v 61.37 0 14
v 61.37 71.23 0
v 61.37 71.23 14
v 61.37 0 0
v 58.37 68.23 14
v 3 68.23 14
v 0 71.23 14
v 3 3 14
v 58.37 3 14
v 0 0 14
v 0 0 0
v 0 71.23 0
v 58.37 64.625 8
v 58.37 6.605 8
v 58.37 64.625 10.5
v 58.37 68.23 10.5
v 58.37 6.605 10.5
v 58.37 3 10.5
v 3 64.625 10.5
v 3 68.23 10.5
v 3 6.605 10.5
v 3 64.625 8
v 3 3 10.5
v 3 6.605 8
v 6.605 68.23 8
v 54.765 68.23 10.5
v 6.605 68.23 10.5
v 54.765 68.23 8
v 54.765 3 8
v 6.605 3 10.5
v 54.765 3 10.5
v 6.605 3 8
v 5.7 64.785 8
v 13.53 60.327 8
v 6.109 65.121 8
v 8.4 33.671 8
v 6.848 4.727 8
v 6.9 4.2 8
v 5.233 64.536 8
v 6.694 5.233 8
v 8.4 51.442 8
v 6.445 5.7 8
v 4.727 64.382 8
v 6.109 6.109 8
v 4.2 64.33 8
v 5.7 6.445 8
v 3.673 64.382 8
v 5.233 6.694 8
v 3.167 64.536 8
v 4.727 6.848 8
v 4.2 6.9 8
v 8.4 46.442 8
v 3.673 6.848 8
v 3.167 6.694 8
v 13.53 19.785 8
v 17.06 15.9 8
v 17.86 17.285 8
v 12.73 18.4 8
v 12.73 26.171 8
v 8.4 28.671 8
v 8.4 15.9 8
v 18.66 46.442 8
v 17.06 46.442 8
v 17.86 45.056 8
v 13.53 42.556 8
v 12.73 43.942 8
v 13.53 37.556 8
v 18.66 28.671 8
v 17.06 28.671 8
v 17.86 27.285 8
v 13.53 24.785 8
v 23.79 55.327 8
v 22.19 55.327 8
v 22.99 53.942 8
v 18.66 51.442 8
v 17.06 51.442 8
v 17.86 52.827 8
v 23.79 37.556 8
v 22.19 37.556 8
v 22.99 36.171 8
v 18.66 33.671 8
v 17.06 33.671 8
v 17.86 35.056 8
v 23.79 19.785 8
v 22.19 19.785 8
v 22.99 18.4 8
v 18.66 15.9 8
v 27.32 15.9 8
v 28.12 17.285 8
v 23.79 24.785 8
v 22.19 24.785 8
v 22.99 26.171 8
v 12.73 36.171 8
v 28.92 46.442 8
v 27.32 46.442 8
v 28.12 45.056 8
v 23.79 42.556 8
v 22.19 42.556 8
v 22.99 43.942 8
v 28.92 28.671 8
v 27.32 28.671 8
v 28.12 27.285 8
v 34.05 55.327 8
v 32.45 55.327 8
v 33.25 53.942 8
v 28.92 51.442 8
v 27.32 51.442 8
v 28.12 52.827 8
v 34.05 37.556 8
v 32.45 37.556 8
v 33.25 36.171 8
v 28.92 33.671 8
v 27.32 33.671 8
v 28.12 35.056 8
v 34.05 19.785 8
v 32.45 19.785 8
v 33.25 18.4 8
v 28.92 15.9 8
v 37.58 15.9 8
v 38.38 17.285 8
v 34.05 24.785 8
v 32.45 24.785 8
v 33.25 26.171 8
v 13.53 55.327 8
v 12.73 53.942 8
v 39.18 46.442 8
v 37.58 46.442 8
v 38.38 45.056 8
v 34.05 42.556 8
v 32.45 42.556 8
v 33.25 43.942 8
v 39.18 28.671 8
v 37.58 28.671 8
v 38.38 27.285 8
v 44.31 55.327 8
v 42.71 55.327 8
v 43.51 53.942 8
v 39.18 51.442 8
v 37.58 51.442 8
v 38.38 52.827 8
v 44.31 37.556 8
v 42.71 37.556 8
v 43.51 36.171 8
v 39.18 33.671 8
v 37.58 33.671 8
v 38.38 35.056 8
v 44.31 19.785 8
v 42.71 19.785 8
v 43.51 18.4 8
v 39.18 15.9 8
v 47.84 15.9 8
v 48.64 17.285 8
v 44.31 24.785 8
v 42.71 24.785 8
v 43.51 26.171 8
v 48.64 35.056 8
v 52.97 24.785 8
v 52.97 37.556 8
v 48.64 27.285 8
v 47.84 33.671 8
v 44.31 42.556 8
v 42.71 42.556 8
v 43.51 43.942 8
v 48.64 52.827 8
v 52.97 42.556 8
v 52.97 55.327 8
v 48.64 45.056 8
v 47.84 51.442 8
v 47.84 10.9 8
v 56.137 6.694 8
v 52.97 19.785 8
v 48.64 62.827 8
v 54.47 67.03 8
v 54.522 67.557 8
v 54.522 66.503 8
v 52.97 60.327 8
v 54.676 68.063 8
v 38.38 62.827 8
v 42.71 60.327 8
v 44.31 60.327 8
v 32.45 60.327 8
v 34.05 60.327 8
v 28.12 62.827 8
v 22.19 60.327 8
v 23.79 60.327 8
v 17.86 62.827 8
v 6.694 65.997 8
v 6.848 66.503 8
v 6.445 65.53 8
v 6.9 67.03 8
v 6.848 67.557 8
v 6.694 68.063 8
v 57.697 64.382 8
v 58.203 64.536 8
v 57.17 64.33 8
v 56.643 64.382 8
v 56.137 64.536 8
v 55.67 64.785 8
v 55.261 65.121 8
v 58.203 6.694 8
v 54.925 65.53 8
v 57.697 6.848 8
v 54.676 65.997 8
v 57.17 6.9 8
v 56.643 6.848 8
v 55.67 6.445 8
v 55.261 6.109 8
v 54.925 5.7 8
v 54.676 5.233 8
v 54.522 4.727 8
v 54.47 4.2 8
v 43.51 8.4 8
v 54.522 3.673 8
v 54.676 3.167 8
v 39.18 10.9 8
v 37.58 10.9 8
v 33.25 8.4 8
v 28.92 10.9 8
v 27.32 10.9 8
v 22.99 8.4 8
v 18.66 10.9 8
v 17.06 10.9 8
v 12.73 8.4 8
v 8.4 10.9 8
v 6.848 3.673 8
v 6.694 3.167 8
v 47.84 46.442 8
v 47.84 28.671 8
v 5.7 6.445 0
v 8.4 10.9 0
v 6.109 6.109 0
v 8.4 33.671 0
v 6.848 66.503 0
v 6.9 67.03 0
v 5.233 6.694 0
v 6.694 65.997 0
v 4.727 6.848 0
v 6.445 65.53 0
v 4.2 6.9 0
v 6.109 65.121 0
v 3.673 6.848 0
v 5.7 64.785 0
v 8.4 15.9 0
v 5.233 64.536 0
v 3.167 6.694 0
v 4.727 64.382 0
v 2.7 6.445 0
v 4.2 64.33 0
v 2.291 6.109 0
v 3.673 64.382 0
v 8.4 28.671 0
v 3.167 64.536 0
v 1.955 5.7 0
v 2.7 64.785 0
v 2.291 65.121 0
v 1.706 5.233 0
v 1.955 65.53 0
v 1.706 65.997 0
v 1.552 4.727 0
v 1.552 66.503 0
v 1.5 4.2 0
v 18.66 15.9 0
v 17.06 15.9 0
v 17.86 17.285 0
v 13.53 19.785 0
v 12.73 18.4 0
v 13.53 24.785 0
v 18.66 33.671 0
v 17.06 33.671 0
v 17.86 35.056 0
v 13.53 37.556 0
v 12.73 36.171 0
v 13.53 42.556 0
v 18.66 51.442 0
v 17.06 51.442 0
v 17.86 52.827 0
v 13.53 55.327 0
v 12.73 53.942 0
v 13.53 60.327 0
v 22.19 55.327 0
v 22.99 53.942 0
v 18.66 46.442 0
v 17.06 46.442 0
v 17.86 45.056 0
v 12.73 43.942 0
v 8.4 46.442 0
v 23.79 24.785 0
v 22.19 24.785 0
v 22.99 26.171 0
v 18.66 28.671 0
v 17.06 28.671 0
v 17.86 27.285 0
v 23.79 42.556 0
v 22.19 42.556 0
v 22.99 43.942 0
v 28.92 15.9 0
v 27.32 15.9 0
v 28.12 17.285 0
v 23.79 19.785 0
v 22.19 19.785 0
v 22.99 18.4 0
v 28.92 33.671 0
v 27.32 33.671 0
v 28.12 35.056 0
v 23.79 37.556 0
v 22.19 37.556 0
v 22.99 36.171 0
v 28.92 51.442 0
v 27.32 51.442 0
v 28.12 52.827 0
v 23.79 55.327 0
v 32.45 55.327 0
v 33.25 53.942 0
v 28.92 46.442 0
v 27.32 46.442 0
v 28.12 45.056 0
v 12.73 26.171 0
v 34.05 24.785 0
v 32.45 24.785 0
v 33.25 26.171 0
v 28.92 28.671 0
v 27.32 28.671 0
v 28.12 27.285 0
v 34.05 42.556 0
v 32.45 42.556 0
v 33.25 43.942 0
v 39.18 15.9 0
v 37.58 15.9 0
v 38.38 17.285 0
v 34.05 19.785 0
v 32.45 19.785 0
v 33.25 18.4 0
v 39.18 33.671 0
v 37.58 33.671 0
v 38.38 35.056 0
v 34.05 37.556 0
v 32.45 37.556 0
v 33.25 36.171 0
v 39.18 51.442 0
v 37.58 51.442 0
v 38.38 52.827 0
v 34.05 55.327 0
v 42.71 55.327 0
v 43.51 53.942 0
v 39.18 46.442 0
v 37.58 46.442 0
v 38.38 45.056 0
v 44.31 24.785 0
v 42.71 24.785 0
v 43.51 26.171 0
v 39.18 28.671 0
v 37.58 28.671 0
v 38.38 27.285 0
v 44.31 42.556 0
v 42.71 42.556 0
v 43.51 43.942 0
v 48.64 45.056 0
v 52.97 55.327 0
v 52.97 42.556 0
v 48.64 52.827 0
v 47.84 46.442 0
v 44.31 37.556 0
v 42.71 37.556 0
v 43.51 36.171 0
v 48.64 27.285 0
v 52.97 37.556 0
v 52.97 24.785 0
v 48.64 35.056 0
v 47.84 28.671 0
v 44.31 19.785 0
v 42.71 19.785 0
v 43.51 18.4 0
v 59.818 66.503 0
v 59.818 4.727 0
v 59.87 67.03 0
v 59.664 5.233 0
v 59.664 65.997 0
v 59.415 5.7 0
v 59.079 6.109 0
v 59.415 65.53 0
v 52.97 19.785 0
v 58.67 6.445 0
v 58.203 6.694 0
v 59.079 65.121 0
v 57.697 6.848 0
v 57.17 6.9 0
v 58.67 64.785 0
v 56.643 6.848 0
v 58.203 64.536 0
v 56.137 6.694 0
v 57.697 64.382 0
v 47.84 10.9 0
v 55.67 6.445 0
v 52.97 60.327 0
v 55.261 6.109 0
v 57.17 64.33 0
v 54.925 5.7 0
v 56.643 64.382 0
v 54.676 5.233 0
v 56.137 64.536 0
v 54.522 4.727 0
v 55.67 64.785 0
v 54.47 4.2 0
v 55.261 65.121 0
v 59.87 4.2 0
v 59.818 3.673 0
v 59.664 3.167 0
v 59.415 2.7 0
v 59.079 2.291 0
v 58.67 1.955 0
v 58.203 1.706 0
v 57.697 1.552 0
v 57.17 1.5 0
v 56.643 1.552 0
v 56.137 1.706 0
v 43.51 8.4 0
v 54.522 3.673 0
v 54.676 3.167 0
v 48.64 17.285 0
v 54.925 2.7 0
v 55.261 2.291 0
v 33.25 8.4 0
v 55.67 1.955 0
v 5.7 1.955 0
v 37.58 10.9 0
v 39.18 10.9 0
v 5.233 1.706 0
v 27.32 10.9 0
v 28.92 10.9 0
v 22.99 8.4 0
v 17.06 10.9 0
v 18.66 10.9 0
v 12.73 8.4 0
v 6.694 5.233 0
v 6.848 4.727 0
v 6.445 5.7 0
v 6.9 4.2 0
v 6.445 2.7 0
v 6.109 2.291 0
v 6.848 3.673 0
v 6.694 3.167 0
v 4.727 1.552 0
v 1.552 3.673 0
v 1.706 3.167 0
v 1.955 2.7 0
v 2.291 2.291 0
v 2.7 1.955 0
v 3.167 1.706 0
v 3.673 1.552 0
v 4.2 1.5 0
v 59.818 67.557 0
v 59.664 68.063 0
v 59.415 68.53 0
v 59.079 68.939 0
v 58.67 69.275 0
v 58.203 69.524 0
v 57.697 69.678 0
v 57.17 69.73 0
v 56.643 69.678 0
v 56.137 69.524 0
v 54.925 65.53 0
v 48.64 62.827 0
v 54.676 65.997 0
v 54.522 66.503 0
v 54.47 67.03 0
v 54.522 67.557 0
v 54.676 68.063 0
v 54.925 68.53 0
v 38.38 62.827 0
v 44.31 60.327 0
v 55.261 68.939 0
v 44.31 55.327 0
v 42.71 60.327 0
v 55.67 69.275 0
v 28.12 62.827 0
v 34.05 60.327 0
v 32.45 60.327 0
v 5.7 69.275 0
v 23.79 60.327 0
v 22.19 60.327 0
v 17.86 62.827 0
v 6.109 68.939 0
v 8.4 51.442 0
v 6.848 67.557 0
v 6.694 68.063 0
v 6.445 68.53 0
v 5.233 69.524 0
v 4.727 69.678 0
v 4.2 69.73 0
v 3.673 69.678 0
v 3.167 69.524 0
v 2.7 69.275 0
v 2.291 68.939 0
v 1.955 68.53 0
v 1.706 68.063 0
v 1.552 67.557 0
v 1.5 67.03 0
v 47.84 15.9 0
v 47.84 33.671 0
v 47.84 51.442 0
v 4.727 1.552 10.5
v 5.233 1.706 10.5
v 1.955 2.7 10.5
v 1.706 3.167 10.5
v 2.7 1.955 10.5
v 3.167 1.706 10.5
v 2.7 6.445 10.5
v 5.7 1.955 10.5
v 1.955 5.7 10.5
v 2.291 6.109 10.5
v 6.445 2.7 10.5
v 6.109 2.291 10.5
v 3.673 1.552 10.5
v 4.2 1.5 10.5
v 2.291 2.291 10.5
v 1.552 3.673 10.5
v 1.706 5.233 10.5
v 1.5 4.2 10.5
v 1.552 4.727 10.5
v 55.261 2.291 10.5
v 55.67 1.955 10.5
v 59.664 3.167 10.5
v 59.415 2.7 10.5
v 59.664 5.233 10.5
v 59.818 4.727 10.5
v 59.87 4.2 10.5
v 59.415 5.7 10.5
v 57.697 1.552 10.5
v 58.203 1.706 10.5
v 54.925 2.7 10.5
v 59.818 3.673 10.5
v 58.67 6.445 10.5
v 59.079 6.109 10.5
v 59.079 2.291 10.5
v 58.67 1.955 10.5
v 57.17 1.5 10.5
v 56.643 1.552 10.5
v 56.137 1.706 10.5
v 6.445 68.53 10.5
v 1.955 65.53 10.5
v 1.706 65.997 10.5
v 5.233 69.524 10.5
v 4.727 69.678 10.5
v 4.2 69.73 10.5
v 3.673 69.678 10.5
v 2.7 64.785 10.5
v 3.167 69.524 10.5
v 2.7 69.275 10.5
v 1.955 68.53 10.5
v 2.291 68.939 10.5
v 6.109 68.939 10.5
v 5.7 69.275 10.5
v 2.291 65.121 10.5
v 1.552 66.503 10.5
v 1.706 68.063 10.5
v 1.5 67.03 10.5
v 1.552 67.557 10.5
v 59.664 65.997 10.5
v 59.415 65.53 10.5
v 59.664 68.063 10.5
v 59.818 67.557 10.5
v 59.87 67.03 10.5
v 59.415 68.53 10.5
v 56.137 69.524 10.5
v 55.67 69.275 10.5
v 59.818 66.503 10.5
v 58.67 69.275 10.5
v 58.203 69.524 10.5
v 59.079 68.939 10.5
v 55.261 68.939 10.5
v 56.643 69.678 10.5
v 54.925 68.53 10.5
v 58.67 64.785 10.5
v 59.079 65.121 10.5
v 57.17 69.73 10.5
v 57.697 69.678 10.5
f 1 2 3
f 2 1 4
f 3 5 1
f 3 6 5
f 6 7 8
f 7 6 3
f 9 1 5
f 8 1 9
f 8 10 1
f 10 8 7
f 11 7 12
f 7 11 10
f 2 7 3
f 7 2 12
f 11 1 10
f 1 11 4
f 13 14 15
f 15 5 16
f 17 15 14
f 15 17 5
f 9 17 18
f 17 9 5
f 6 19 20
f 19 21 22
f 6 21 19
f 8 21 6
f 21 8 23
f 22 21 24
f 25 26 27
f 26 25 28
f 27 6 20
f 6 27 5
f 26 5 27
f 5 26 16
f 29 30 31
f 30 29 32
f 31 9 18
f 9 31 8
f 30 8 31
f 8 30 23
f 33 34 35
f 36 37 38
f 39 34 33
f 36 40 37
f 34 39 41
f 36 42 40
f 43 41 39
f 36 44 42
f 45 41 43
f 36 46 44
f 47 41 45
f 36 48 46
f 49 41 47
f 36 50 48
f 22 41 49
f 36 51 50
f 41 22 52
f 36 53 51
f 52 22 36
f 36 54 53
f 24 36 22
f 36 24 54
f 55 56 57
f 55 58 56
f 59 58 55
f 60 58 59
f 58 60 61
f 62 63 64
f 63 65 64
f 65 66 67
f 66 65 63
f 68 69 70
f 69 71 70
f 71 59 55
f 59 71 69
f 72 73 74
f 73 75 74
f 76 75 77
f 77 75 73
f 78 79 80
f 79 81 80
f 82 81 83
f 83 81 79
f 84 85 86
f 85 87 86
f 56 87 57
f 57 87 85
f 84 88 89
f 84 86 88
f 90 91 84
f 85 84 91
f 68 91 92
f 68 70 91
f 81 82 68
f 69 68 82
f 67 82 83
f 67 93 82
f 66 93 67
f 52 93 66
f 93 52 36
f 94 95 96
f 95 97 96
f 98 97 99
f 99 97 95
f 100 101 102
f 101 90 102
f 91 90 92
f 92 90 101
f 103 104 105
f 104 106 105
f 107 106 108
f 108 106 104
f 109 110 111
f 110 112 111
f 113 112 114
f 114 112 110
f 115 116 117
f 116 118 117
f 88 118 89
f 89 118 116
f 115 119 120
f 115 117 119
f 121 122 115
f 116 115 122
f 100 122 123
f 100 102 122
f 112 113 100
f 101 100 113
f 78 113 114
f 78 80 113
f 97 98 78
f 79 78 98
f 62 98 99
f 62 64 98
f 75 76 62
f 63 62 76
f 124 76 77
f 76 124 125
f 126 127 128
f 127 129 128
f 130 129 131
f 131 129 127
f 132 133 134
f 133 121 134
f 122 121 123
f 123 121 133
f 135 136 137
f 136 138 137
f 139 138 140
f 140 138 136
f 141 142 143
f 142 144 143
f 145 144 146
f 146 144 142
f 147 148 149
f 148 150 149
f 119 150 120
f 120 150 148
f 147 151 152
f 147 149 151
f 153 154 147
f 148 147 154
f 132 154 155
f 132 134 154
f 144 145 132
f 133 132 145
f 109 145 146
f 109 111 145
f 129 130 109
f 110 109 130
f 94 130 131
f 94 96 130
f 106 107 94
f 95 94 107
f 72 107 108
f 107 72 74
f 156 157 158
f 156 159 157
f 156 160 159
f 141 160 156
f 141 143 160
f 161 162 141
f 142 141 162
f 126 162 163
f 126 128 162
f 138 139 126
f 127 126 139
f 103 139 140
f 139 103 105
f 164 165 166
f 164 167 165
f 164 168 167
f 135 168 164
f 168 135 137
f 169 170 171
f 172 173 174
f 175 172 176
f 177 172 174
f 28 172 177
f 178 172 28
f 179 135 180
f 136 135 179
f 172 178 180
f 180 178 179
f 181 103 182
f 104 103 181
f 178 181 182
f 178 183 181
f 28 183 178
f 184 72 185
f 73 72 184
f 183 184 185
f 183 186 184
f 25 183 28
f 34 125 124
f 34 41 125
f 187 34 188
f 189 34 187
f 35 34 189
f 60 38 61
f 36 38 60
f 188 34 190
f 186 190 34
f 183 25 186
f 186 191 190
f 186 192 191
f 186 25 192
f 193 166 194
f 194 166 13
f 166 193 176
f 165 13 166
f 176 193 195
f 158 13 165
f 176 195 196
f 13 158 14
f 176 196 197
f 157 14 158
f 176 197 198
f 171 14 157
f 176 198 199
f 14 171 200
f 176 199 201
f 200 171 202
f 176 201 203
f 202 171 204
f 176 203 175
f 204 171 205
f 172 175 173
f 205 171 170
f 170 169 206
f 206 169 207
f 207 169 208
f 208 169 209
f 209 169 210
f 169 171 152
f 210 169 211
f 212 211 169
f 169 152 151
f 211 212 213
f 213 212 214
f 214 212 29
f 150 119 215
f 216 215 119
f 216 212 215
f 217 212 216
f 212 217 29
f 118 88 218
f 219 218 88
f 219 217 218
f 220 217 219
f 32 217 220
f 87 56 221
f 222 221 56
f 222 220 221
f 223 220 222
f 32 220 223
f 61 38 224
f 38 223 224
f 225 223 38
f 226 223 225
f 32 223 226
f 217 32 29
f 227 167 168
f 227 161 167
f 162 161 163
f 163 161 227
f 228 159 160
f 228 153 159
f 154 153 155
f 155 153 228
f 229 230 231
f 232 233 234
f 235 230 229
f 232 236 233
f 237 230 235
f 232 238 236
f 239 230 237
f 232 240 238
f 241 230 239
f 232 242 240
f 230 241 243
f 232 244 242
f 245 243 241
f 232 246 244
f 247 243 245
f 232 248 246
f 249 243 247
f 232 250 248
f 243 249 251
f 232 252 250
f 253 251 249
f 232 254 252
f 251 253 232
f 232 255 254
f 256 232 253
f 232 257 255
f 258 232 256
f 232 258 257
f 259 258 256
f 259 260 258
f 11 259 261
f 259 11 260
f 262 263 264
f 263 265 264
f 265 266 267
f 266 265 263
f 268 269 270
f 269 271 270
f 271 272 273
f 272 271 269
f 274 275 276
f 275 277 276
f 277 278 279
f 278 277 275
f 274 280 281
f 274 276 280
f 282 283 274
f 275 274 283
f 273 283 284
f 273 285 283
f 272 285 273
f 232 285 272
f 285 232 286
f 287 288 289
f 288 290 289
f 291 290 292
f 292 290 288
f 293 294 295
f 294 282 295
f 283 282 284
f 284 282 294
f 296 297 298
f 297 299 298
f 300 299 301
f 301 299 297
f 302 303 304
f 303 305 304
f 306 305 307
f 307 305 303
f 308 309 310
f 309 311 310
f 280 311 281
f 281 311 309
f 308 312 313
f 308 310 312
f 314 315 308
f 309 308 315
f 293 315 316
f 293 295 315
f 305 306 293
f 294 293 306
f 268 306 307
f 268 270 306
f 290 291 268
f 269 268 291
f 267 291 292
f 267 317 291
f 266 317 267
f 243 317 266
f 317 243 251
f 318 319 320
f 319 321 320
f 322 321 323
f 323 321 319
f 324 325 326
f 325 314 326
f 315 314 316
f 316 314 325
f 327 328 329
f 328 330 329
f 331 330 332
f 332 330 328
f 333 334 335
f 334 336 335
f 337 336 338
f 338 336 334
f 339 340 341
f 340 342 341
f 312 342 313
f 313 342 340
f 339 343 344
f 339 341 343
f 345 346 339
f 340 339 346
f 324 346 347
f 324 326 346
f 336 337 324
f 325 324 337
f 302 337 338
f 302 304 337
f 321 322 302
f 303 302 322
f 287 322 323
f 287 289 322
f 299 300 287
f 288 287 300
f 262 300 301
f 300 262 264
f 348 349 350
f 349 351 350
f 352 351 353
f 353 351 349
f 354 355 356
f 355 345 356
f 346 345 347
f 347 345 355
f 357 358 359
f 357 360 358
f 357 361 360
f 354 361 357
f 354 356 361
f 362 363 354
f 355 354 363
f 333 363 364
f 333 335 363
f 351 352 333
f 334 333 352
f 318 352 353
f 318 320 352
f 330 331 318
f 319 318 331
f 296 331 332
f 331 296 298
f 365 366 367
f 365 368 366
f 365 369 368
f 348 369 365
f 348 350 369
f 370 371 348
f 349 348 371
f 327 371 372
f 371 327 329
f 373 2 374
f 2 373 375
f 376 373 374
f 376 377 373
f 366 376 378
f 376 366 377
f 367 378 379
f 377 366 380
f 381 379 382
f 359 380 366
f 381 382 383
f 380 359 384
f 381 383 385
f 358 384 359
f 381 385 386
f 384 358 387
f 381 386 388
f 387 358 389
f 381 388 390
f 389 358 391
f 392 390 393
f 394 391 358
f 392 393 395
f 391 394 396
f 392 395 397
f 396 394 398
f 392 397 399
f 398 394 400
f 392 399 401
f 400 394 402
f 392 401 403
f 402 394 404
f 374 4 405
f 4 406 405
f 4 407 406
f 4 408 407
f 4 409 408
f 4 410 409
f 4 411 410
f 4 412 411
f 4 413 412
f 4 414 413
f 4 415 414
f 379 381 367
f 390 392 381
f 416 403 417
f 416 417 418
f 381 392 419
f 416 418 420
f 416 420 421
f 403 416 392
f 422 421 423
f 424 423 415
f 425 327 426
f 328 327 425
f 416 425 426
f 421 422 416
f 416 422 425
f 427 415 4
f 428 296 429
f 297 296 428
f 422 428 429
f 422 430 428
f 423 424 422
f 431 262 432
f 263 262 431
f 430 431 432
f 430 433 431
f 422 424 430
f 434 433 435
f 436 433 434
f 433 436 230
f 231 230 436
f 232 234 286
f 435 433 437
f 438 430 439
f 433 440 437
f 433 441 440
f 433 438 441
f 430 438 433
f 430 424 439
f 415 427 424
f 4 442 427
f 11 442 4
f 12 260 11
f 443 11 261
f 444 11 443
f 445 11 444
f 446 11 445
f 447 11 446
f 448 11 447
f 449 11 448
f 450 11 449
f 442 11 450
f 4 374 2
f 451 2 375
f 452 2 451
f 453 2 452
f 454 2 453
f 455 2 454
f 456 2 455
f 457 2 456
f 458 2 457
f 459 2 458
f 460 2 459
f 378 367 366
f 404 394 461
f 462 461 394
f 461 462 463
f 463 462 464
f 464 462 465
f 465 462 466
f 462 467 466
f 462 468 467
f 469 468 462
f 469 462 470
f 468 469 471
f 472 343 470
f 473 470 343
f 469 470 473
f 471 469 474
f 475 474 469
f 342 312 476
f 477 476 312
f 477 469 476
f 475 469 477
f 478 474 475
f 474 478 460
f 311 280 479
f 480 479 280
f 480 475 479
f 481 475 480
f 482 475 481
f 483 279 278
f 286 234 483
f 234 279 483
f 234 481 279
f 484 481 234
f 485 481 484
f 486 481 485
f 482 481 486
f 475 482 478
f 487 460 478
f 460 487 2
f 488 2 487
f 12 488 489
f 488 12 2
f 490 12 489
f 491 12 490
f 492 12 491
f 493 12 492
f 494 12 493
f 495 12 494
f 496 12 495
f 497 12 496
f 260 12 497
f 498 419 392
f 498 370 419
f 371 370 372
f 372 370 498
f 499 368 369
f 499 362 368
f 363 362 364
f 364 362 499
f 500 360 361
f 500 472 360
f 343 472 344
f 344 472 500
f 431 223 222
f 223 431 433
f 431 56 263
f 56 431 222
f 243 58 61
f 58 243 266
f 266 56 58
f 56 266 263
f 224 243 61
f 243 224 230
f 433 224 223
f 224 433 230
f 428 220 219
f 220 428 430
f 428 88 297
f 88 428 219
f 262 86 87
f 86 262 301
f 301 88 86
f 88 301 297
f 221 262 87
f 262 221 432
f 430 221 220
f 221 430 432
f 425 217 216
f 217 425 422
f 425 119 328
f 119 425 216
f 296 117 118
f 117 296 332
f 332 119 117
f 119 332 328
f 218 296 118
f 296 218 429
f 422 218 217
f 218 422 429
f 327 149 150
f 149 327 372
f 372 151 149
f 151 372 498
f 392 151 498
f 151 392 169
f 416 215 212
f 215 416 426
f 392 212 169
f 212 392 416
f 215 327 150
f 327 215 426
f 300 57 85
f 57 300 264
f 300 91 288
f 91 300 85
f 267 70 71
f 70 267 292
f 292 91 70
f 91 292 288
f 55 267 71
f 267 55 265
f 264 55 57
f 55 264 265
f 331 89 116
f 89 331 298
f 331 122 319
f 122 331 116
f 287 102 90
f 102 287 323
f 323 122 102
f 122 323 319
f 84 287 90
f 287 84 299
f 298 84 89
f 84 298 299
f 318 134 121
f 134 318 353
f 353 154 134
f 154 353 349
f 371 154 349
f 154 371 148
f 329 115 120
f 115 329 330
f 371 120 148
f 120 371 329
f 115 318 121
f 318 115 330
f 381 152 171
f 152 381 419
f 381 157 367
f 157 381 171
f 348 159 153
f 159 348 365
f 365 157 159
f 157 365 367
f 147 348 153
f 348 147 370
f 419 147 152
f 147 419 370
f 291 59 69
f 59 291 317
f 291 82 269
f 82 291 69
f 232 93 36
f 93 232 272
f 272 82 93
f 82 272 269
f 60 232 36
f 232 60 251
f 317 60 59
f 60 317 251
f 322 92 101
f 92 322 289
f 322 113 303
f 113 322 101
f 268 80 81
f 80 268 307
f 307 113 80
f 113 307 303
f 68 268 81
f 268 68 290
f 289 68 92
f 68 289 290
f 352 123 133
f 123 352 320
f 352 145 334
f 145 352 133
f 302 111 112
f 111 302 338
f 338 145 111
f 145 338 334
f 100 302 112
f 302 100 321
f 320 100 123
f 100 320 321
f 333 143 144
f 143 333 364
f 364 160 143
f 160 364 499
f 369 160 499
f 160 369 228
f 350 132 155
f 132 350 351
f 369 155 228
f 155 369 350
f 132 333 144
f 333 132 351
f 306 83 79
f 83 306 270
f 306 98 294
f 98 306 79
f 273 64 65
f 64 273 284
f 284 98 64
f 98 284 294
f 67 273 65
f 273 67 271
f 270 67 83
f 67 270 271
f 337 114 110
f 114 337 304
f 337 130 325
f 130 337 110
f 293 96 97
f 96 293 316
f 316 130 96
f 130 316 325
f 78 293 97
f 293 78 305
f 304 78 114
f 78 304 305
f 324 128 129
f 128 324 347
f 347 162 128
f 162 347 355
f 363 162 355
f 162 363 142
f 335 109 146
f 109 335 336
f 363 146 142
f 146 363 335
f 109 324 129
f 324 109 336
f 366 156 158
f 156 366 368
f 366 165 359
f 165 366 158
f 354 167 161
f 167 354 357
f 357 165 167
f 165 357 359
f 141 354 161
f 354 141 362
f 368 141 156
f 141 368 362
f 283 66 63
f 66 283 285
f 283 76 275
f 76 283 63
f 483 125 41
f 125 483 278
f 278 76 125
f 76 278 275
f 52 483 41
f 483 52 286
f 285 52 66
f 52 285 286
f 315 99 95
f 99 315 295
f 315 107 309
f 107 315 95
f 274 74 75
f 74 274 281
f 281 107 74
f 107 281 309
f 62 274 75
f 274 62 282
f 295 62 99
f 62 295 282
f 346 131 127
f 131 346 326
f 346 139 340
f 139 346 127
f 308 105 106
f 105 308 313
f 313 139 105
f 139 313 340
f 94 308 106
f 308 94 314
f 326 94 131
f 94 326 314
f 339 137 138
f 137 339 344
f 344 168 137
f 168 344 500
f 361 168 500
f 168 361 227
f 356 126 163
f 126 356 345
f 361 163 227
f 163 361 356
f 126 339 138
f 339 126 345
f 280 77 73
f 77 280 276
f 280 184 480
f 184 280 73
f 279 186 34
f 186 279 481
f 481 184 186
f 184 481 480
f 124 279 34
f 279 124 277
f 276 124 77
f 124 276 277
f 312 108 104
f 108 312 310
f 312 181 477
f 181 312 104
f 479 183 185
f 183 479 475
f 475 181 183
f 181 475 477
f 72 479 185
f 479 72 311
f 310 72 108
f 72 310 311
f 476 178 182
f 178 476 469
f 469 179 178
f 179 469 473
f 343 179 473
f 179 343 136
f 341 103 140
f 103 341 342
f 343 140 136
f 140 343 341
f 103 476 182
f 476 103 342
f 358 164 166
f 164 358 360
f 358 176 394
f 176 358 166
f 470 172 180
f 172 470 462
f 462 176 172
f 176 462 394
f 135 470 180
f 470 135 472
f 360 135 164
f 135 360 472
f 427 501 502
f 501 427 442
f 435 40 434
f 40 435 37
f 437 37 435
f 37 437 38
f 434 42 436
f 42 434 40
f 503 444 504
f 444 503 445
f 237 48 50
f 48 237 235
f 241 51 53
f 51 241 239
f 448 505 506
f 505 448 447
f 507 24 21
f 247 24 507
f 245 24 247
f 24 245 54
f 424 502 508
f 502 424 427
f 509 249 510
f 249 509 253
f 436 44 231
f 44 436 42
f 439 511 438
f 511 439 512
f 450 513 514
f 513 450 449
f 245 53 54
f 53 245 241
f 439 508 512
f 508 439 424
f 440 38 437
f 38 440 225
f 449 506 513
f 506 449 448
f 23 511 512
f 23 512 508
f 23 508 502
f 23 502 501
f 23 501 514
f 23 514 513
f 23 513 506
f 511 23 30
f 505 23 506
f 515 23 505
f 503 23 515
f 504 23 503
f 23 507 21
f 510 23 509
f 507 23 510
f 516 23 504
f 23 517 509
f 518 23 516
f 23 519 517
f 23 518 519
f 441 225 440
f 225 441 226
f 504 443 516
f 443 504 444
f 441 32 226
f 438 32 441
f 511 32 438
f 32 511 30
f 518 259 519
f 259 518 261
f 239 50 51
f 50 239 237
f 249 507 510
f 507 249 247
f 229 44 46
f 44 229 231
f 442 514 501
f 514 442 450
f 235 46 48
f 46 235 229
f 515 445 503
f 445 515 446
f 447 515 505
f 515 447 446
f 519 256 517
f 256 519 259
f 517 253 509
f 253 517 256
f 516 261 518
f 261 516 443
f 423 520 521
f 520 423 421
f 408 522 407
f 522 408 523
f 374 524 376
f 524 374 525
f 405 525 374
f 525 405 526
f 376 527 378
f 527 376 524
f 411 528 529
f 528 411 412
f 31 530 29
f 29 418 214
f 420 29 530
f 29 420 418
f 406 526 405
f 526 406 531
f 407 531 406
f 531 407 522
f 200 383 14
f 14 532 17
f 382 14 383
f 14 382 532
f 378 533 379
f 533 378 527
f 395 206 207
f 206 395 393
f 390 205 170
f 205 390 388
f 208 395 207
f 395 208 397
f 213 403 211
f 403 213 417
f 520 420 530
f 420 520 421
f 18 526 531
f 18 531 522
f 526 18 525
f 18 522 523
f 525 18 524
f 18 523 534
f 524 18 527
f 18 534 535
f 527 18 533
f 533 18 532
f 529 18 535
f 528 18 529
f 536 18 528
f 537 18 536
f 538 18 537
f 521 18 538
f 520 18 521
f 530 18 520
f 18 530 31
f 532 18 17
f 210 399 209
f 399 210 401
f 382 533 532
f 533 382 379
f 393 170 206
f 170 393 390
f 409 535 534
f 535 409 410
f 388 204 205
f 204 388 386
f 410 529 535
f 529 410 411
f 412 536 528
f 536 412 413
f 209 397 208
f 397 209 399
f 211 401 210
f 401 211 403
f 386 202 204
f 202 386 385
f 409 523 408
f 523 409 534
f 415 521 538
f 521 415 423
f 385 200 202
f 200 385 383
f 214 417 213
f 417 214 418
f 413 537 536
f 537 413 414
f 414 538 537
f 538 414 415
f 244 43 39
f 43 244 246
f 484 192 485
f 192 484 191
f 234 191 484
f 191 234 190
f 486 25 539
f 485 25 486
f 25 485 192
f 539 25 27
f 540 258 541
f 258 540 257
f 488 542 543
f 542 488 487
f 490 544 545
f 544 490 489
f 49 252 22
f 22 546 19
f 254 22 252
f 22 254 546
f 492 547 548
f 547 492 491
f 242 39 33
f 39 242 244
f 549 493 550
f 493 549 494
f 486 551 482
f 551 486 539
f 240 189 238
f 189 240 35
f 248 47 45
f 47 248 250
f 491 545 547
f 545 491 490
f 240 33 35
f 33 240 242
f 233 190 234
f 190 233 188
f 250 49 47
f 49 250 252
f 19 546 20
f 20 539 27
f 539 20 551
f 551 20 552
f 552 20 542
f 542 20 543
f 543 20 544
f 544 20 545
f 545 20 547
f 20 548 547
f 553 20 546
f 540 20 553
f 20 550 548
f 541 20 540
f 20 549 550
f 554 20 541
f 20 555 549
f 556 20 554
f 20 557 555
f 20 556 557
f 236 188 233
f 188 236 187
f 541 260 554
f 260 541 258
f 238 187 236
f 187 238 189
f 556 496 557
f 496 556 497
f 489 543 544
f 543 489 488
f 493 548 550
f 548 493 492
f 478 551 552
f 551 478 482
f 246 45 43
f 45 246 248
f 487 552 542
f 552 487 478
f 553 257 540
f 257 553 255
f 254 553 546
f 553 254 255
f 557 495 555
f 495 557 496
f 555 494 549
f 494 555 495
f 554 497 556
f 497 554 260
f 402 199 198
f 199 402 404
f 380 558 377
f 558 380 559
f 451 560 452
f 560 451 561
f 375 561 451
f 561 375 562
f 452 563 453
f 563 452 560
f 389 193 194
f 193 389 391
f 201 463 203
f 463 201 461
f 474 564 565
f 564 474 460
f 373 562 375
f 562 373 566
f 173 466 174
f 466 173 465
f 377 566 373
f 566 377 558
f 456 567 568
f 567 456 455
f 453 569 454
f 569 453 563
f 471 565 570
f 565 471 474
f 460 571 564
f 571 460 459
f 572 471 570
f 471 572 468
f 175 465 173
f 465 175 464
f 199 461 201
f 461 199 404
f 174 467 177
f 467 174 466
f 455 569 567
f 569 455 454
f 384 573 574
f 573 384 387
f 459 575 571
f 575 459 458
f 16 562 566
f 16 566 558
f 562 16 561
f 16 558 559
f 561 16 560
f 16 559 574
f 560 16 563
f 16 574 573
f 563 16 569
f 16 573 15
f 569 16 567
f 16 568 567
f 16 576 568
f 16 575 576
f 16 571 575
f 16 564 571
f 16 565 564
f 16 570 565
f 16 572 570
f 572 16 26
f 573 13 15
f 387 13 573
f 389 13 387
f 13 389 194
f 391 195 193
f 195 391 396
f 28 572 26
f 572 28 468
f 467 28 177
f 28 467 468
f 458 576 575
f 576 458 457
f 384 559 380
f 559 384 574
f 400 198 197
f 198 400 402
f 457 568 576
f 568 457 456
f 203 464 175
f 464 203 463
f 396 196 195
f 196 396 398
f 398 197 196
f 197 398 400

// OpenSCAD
$fn = 32;

// ----------------------------------------------------------------------
// Honeycomb panel: 61.37 x 71.23 mm, 24 cells of 10 mm
// ----------------------------------------------------------------------

// --- parameters (mm) ---
panel_w = 61.37;          // panel width
panel_d = 71.23;          // panel depth
thick = 8;                // panel thickness
cell_r = 5;               // hex cell circumradius
pitch = 10.26;            // hex cell pitch (centre to centre)
web = 1.6;                // web between the cells
columns = 4;              // columns of cells
rows = 6;                 // rows of cells
cell_count = 24;          // total cells
shift_x = 12.73;          // first cell offset in x
shift_y = 13.4;           // first cell offset in y
mount_d = 5.4;            // corner mounting holes
hole_off = 4.2;           // mounting hole offset from the corners
rim_h = 14;               // rim height
rim_t = 3;                // rim wall thickness

difference() {
  union() {
    cube([panel_w, panel_d, thick]);
    /* rim around the panel, sunk 1 mm into the plate */
    translate([0, 0, thick - 1]) difference() {
      cube([panel_w, panel_d, rim_h - thick + 1]);
      translate([rim_t, rim_t, -2.5]) cube([panel_w - 2 * rim_t, panel_d - 2 * rim_t, rim_h - thick + 6]);
    }
  }
  /* hexagonal cells, point-up, cut right through the plate */
  for (row = [0 : rows - 1]) {
    for (col = [0 : columns - 1]) {
      translate([shift_x + col * pitch + (row % 2) * pitch / 2, shift_y + row * pitch * 0.866025, -2.5]) rotate([0, 0, 30]) cylinder(h = thick + 5, d = 2 * cell_r, $fn = 6);
    }
  }
  /* corner mounting holes, clear of the outer cell web */
  translate([4.2, 4.2, -2.5]) cylinder(h = thick + 5, d = mount_d);
  translate([57.17, 4.2, -2.5]) cylinder(h = thick + 5, d = mount_d);
  translate([4.2, 67.03, -2.5]) cylinder(h = thick + 5, d = mount_d);
  translate([57.17, 67.03, -2.5]) cylinder(h = thick + 5, d = mount_d);
}
